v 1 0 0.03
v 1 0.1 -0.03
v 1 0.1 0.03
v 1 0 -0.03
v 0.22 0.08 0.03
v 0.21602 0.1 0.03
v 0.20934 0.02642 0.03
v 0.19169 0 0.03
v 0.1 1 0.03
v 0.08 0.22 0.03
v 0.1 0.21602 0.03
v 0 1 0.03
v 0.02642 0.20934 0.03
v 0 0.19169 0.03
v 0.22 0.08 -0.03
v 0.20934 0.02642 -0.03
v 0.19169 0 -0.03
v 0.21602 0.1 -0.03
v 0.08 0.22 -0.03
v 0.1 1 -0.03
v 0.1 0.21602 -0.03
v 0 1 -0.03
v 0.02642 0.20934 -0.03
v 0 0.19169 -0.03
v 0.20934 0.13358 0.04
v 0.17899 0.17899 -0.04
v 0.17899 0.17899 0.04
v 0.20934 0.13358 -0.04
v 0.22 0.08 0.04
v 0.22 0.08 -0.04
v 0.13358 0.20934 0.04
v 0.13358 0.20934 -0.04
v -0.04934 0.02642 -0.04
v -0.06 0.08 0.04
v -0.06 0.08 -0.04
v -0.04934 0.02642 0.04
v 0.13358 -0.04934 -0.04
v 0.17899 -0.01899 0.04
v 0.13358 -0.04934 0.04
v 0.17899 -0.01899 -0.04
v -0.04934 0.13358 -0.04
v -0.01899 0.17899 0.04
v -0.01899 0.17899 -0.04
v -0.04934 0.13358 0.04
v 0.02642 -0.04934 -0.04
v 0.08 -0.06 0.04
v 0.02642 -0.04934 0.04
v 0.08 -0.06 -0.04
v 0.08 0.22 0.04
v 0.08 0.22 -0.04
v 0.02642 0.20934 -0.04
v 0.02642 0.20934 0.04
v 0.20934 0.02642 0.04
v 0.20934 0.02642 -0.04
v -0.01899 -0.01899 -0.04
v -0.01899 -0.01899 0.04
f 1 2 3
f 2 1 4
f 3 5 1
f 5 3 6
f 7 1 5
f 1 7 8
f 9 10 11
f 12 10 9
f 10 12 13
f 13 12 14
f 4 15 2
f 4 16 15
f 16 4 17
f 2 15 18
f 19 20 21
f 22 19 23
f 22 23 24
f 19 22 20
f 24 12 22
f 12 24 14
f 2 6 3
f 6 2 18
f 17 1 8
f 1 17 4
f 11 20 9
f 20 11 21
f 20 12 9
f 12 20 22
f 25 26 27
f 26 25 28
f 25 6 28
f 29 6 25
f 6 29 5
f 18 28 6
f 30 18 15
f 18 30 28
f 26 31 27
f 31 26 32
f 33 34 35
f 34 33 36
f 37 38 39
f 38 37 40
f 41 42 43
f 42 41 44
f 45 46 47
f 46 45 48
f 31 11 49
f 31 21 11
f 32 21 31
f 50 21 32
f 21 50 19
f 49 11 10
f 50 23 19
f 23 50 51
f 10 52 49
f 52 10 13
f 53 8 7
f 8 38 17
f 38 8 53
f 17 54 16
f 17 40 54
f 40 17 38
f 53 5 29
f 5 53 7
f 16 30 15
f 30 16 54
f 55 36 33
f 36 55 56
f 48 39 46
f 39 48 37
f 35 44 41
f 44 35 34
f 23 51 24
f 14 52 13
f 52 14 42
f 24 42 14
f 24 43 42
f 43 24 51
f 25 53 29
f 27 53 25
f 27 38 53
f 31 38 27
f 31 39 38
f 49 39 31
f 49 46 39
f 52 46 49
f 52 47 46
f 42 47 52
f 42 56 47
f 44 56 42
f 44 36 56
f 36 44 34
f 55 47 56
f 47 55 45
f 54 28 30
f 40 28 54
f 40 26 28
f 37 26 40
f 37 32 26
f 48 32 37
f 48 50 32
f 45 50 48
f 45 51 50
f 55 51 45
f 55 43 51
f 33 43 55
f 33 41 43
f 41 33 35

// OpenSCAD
// hud_frame_bracket.scad
// 3D HUD corner framing bracket for in-scene camera UI cards.
// Authored for WoWViewer camera-rigged 3D HUD.

$fn = 16;

module hud_frame_bracket() {
    difference() {
        union() {
            // Horizontal arm
            translate([0.5, 0.05, 0])
            cube([1.0, 0.1, 0.06], center = true);

            // Vertical arm
            translate([0.05, 0.5, 0])
            cube([0.1, 1.0, 0.06], center = true);

            // Corner beveled boss
            translate([0.08, 0.08, 0])
            cylinder(r = 0.14, h = 0.08, center = true);
        }

        // Inner bevel cut
        translate([0.25, 0.25, 0])
        rotate([0, 0, 45])
        cube([0.15, 0.15, 0.2], center = true);
    }
}

hud_frame_bracket();
